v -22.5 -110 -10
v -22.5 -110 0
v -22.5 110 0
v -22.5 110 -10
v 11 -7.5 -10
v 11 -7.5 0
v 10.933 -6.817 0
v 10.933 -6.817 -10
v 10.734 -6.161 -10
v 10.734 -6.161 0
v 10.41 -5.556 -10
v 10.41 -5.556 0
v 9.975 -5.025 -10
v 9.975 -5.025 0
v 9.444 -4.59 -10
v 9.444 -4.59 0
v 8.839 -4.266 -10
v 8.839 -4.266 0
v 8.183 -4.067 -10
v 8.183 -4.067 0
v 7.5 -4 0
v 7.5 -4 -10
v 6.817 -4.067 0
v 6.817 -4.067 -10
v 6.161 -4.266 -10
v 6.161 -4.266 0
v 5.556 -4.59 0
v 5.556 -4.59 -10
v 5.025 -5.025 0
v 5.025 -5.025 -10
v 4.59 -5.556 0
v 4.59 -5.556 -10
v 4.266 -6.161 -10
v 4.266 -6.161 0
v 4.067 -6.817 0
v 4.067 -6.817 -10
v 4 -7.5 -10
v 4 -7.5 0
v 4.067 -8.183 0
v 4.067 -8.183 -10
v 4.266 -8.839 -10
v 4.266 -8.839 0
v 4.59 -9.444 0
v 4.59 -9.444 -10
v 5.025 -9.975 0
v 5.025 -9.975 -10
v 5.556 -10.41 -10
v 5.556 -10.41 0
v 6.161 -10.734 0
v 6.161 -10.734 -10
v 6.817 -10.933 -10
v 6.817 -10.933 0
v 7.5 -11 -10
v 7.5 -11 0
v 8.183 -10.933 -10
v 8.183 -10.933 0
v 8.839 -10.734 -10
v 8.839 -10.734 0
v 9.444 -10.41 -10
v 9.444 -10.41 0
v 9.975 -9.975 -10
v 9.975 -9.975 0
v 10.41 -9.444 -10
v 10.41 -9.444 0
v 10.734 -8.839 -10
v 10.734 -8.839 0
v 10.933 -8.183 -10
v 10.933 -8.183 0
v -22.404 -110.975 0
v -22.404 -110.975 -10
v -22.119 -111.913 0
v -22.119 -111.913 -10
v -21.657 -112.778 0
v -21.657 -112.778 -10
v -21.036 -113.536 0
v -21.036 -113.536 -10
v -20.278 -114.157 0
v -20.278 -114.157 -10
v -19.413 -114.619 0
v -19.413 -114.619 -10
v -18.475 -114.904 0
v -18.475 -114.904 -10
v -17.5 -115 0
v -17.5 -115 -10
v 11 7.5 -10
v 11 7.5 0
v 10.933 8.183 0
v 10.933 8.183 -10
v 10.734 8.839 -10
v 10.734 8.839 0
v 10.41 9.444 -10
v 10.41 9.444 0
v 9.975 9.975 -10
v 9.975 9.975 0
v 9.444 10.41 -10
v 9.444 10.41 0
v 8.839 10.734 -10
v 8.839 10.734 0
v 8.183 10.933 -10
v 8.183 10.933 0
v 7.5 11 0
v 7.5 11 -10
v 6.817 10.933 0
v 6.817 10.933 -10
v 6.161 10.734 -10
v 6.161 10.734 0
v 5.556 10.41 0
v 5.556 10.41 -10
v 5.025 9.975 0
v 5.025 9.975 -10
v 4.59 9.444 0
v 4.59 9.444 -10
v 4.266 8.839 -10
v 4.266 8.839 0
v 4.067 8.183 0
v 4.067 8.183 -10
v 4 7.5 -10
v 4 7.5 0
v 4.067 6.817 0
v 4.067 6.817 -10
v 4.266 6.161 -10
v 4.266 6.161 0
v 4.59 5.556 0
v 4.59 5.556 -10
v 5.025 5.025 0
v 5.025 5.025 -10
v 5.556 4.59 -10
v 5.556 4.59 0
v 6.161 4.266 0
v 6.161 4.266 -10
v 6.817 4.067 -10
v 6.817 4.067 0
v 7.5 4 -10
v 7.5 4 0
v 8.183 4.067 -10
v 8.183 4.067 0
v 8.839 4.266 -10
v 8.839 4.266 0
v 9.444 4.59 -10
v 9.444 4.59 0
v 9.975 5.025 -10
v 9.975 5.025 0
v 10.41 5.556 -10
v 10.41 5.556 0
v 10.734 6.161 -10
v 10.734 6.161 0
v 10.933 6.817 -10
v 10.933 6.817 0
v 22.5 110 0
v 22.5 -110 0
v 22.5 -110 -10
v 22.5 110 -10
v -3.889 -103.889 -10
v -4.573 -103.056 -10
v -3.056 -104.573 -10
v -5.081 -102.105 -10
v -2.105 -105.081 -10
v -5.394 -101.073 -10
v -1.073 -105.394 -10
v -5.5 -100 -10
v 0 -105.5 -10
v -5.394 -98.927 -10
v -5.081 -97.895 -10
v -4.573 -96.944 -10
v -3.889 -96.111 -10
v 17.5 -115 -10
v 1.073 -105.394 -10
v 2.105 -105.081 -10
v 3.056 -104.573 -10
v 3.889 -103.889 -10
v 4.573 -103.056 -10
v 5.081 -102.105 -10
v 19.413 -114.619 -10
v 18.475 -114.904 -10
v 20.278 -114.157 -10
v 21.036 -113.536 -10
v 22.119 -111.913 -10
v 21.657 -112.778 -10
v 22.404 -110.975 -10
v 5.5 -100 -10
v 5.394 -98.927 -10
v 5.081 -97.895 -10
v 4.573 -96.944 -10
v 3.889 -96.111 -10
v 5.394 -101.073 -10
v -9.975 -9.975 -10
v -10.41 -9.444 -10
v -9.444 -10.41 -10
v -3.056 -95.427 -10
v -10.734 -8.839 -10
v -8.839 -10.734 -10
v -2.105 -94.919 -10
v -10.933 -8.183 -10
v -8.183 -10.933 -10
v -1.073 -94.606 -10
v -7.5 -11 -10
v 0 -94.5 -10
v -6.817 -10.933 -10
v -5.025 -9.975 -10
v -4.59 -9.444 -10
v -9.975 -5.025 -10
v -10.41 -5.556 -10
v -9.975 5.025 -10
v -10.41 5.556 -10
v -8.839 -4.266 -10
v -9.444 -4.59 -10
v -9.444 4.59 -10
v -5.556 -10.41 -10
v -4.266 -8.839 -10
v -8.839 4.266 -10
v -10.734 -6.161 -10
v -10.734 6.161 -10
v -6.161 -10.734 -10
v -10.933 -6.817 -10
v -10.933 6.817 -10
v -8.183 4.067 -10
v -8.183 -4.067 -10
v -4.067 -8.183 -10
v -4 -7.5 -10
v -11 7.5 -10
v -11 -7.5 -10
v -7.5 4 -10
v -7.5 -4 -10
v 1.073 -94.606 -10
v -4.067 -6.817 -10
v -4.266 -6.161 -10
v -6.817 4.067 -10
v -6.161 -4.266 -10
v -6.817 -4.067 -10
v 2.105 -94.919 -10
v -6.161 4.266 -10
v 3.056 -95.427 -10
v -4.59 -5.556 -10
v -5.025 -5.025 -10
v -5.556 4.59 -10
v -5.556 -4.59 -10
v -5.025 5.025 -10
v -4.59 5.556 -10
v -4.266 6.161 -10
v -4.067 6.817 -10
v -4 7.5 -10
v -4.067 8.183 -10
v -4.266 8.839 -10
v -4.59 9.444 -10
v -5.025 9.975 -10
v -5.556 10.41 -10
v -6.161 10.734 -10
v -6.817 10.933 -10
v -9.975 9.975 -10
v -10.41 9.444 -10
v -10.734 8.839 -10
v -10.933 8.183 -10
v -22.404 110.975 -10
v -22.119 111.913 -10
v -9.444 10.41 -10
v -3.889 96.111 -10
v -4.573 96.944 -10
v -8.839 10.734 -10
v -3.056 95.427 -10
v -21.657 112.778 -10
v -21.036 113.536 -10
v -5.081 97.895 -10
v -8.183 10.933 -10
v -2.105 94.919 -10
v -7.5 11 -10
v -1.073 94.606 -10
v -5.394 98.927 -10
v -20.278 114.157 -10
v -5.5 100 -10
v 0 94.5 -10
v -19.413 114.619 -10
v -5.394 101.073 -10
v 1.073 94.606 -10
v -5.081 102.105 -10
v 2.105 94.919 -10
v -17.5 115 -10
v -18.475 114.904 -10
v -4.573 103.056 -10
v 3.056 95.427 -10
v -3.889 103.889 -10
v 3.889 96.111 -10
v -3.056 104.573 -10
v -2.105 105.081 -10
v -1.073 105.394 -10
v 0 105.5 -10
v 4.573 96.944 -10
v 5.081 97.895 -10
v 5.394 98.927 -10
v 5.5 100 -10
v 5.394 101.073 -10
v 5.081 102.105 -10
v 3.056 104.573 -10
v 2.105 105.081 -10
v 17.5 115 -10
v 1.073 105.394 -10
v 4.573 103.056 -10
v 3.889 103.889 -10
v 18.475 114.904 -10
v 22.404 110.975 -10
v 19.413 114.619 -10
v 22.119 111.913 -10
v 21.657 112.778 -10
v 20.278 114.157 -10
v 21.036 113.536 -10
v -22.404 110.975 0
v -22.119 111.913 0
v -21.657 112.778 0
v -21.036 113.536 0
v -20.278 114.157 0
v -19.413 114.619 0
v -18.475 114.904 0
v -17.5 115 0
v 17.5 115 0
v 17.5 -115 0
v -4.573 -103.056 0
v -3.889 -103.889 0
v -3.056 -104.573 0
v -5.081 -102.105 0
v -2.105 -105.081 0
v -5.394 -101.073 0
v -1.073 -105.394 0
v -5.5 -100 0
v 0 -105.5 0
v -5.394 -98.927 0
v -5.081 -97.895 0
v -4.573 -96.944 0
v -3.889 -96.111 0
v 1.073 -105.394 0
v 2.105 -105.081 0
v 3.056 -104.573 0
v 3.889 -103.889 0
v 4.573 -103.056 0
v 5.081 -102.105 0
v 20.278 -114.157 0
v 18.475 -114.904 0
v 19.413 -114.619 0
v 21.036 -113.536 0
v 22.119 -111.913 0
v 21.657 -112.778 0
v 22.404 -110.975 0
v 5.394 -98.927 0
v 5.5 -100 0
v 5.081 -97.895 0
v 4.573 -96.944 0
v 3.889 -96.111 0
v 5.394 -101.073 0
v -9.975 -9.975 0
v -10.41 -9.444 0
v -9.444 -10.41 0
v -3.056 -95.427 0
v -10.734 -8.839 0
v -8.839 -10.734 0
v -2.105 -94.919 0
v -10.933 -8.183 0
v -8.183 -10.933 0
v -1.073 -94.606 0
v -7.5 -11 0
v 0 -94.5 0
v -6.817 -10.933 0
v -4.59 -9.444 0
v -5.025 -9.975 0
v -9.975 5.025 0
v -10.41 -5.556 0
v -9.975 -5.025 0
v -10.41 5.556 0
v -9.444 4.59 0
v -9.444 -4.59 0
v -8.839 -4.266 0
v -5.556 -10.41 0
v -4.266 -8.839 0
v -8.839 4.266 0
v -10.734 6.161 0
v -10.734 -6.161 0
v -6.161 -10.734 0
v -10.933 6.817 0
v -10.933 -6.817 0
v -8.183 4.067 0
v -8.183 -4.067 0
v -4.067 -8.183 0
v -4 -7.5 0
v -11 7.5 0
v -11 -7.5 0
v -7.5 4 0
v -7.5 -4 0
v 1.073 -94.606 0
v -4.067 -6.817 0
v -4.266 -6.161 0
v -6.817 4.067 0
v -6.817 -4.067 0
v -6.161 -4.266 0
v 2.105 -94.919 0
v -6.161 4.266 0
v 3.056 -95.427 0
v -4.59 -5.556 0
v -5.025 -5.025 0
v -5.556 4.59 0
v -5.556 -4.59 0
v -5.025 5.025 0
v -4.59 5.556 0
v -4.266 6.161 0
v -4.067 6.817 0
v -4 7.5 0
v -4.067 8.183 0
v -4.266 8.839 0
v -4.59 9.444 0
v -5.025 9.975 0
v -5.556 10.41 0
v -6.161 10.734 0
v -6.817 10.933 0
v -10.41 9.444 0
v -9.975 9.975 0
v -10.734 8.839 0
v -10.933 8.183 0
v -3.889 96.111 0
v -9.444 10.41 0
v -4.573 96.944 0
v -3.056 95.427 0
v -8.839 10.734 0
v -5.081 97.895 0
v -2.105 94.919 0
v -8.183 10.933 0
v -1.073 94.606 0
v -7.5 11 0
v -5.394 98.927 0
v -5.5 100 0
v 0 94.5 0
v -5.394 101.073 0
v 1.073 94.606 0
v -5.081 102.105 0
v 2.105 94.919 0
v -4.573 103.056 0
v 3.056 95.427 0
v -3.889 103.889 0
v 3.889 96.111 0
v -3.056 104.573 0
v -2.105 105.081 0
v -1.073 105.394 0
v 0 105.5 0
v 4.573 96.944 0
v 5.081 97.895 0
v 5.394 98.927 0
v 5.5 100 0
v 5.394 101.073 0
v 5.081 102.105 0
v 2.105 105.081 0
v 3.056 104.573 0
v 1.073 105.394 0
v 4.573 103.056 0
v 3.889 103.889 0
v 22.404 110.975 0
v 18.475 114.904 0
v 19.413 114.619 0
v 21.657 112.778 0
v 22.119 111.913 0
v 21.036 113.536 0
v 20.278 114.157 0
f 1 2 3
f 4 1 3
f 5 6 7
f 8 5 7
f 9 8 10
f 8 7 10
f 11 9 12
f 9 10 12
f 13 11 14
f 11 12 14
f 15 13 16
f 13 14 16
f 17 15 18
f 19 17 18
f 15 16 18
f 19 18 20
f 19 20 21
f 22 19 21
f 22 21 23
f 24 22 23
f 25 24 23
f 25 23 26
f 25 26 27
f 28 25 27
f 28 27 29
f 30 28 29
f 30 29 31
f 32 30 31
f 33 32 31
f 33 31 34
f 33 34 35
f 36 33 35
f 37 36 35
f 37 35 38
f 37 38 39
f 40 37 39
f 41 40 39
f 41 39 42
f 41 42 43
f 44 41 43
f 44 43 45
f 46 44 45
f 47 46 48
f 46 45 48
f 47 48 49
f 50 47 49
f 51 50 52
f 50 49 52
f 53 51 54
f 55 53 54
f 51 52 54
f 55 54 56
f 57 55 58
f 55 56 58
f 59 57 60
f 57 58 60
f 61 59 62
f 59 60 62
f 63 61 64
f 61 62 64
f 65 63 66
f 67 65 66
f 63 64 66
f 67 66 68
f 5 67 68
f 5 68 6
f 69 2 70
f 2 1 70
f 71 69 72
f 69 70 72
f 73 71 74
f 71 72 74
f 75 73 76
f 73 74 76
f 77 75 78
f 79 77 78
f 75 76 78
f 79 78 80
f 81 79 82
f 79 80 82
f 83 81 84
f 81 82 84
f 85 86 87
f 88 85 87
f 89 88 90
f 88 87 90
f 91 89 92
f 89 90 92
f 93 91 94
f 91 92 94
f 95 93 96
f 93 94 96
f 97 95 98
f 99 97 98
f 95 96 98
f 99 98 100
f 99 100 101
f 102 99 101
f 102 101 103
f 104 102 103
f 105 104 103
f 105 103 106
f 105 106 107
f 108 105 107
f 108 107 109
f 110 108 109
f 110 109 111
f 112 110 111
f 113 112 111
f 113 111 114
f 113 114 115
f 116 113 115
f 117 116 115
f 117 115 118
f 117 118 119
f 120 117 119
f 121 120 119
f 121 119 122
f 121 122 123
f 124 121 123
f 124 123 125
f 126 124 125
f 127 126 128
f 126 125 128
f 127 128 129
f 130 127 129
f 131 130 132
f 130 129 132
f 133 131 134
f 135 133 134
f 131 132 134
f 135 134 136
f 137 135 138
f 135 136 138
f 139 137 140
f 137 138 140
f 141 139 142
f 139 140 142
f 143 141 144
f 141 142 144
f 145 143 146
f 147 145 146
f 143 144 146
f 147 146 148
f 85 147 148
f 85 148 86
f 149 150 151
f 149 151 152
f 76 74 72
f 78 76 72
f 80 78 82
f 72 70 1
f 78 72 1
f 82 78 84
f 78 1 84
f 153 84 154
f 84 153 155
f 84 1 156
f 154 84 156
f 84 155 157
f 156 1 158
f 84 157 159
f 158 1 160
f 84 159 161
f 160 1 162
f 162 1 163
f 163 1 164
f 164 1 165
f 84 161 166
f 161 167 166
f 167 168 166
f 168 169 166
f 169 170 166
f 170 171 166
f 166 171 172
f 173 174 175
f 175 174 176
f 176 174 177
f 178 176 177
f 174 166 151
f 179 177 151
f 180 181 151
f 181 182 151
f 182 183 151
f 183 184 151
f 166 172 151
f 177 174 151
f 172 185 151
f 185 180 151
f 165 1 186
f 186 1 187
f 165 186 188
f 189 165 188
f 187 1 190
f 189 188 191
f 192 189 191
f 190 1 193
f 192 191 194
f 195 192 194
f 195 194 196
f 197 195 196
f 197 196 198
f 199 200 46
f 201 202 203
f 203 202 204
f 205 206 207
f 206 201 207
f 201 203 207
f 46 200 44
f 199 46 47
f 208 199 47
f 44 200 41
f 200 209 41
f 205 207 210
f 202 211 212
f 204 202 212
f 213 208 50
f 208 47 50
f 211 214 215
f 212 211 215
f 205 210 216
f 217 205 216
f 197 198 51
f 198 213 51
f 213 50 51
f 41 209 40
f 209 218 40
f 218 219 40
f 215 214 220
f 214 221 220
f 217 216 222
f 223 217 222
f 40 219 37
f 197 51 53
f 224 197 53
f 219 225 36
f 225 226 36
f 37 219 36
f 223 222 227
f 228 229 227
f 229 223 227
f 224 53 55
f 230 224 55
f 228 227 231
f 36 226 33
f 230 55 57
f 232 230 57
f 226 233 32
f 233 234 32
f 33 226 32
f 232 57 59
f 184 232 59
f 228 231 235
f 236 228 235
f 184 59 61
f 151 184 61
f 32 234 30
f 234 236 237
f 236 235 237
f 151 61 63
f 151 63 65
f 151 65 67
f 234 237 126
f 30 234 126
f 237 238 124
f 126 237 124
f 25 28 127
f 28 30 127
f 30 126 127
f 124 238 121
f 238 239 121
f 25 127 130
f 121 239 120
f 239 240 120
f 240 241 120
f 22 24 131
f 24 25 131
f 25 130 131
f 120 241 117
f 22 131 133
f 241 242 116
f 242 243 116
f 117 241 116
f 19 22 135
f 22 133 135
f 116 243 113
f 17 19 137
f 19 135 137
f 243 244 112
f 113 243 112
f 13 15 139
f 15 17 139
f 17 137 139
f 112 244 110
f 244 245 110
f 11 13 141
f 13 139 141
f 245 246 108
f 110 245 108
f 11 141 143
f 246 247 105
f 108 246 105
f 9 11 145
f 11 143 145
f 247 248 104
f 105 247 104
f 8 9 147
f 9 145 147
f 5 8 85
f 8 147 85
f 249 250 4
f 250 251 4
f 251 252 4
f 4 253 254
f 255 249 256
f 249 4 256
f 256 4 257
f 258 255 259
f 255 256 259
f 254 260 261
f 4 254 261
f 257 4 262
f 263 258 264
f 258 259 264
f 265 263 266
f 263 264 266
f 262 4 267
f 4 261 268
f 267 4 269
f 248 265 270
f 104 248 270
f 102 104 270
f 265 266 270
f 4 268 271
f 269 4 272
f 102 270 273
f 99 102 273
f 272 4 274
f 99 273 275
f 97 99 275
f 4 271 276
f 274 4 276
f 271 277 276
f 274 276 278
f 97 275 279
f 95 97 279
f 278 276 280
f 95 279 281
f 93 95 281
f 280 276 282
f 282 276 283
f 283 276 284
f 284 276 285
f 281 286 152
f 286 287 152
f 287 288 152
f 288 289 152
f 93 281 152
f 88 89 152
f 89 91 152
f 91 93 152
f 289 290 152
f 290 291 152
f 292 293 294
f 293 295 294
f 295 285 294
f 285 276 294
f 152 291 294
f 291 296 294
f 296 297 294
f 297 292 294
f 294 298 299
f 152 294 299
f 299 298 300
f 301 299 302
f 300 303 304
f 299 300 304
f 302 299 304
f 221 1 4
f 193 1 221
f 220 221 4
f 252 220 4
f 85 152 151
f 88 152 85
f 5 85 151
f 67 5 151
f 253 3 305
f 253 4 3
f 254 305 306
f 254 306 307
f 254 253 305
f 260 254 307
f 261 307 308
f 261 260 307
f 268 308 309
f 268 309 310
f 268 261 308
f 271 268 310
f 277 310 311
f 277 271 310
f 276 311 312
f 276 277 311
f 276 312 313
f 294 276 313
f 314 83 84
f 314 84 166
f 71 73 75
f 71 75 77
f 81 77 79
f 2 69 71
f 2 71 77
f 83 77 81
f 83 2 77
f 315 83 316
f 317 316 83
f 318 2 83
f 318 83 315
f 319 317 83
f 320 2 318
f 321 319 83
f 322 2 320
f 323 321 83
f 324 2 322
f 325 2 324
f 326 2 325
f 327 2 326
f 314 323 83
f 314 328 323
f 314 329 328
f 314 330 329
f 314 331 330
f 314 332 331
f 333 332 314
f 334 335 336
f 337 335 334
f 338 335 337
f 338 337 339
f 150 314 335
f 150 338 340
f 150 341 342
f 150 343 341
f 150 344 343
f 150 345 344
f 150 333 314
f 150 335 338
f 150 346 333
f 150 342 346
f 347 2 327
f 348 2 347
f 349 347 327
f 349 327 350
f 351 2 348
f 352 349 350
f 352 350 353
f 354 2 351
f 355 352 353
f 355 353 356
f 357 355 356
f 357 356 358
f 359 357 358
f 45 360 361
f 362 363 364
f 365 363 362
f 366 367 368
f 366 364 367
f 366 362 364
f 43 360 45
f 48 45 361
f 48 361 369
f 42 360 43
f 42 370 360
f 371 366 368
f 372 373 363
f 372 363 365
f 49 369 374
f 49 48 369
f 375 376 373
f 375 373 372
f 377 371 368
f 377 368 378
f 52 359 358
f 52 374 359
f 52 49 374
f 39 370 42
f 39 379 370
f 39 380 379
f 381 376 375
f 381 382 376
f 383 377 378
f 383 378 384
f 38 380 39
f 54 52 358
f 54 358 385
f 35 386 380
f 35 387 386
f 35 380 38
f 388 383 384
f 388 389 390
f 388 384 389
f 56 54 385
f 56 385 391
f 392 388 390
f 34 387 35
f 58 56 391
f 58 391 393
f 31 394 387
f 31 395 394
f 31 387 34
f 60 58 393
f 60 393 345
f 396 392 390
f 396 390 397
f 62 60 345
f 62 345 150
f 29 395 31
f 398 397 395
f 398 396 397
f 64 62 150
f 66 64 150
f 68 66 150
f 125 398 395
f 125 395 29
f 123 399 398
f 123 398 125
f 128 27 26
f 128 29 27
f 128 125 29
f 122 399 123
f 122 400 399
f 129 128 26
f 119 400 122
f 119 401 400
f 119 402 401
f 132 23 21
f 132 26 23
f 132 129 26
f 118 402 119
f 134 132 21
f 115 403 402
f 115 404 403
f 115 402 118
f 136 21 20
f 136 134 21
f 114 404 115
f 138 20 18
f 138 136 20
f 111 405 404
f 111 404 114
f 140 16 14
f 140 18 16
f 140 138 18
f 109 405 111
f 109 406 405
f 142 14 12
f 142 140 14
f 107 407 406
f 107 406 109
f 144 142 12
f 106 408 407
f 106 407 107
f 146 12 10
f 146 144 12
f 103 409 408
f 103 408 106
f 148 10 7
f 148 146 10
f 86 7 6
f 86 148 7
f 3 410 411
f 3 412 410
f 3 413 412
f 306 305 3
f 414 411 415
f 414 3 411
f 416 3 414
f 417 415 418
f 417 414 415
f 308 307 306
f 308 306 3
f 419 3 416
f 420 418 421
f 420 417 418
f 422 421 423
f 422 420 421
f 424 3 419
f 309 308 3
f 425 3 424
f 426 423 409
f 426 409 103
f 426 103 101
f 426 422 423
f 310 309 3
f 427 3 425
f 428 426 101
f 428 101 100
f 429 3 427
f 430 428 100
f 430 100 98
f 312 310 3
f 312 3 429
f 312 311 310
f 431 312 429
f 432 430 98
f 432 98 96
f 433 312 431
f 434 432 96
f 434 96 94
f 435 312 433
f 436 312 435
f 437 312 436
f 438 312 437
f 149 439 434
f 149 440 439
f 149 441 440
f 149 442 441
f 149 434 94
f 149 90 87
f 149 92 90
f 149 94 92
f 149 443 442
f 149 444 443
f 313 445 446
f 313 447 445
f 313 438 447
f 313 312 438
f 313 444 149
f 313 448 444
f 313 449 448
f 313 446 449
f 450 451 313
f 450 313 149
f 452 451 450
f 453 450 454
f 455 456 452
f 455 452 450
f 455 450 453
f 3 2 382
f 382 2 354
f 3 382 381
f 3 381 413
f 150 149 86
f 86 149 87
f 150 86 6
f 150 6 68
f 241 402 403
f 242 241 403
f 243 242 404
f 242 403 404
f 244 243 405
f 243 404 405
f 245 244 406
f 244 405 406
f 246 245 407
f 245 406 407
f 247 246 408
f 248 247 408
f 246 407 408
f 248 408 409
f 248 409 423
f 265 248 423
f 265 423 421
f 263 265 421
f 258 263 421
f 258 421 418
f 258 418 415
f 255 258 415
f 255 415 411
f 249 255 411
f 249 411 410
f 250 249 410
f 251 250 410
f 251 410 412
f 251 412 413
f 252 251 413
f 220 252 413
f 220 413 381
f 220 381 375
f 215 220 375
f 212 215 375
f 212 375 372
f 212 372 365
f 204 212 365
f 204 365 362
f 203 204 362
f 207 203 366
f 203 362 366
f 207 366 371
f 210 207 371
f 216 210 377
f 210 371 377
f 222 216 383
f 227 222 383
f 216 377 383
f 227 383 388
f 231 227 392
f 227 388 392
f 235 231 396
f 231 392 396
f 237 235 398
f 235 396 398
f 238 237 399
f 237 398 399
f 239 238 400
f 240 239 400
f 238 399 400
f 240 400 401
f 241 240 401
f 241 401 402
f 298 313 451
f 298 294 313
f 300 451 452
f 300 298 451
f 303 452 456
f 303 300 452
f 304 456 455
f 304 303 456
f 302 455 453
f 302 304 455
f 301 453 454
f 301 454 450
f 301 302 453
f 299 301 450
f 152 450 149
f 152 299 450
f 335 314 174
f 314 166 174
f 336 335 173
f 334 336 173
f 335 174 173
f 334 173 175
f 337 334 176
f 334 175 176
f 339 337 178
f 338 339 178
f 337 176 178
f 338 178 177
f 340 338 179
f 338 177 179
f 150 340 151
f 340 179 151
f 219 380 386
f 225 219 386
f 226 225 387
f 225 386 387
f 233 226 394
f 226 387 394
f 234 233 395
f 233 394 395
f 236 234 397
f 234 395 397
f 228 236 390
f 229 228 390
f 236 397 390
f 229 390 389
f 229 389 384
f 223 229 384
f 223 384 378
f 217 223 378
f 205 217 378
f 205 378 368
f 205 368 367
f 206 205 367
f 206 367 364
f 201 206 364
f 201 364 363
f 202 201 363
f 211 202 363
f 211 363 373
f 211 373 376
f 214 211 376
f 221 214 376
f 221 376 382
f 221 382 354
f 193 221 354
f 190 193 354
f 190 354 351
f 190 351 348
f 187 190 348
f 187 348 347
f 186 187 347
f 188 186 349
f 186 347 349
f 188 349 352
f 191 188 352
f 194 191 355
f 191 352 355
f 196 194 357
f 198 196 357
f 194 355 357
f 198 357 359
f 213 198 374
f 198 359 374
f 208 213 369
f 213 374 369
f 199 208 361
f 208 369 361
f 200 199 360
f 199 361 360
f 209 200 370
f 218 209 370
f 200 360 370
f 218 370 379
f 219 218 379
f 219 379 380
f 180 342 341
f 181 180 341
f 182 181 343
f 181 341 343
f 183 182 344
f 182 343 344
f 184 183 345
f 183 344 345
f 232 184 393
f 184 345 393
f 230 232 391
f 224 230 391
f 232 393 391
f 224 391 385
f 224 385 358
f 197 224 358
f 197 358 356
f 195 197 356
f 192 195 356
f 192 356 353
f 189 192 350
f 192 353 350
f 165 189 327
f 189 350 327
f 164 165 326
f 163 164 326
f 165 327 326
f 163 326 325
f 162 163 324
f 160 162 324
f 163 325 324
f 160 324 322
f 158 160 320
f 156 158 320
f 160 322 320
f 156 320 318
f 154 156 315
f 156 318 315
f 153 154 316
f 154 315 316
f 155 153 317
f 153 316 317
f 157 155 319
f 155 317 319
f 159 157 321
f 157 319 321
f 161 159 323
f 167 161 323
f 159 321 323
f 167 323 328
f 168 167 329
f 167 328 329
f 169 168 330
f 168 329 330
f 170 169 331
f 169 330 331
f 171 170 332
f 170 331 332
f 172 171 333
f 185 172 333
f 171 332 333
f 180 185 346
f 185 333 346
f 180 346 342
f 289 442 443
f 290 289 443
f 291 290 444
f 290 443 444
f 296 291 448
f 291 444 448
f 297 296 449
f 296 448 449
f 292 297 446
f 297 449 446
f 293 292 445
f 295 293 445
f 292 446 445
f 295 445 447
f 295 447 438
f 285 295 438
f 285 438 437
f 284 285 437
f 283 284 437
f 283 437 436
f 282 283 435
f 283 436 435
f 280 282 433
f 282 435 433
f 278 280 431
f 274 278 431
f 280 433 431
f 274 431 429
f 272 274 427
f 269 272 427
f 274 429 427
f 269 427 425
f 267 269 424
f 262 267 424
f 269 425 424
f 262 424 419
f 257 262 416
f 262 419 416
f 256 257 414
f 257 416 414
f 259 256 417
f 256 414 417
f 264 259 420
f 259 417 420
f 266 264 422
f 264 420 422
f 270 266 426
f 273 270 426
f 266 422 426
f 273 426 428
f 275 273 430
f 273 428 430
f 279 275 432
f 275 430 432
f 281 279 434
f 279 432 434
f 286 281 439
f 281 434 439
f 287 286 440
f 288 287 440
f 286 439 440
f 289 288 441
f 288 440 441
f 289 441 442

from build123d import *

# Parameters (mm, degrees)
IZIM1_W               = 45
IZIM1_H               = 230
TABAN_FLAN_1_DEPTH    = 10
IZIM6_R               = 3.5
KES_EKSTR_ZYON1_DEPTH = 26
IZIM7_R               = 5.5
KES_EKSTR_ZYON2_DEPTH = 10
RADYUS1_R             = 5


# Sheet-metal steps are written as plain solids
with BuildPart() as part:
    # Çizim1 → Taban-Flanş1 (new body)
    with BuildSketch(Plane.XY):
        Rectangle(IZIM1_W, IZIM1_H)
    extrude(amount=-TABAN_FLAN_1_DEPTH)

    # Çizim6 → Kes-Ekstrüzyon1 (cut)
    with BuildSketch(Plane.XY):
        with Locations((7.5, 7.5)):
            Circle(IZIM6_R)
        with Locations((-7.5, 7.5)):
            Circle(IZIM6_R)
        with Locations((7.5, -7.5)):
            Circle(IZIM6_R)
        with Locations((-7.5, -7.5)):
            Circle(IZIM6_R)
    extrude(amount=-KES_EKSTR_ZYON1_DEPTH, mode=Mode.SUBTRACT)

    # Çizim7 → Kes-Ekstrüzyon2 (cut)
    with BuildSketch(Plane.XY):
        with Locations((0, -100)):
            Circle(IZIM7_R)
        with Locations((0, 100)):
            Circle(IZIM7_R)
    extrude(amount=-KES_EKSTR_ZYON2_DEPTH, mode=Mode.SUBTRACT)

    # Radyus1
    radyus1_edges = [part.edges().sort_by_distance(p)[0] for p in [
        (22.5, -115, -5),
        (-22.5, -115, -5),
        (-22.5, 115, -5),
        (22.5, 115, -5),
    ]]
    fillet(radyus1_edges, radius=RADYUS1_R)


solid = part.part
